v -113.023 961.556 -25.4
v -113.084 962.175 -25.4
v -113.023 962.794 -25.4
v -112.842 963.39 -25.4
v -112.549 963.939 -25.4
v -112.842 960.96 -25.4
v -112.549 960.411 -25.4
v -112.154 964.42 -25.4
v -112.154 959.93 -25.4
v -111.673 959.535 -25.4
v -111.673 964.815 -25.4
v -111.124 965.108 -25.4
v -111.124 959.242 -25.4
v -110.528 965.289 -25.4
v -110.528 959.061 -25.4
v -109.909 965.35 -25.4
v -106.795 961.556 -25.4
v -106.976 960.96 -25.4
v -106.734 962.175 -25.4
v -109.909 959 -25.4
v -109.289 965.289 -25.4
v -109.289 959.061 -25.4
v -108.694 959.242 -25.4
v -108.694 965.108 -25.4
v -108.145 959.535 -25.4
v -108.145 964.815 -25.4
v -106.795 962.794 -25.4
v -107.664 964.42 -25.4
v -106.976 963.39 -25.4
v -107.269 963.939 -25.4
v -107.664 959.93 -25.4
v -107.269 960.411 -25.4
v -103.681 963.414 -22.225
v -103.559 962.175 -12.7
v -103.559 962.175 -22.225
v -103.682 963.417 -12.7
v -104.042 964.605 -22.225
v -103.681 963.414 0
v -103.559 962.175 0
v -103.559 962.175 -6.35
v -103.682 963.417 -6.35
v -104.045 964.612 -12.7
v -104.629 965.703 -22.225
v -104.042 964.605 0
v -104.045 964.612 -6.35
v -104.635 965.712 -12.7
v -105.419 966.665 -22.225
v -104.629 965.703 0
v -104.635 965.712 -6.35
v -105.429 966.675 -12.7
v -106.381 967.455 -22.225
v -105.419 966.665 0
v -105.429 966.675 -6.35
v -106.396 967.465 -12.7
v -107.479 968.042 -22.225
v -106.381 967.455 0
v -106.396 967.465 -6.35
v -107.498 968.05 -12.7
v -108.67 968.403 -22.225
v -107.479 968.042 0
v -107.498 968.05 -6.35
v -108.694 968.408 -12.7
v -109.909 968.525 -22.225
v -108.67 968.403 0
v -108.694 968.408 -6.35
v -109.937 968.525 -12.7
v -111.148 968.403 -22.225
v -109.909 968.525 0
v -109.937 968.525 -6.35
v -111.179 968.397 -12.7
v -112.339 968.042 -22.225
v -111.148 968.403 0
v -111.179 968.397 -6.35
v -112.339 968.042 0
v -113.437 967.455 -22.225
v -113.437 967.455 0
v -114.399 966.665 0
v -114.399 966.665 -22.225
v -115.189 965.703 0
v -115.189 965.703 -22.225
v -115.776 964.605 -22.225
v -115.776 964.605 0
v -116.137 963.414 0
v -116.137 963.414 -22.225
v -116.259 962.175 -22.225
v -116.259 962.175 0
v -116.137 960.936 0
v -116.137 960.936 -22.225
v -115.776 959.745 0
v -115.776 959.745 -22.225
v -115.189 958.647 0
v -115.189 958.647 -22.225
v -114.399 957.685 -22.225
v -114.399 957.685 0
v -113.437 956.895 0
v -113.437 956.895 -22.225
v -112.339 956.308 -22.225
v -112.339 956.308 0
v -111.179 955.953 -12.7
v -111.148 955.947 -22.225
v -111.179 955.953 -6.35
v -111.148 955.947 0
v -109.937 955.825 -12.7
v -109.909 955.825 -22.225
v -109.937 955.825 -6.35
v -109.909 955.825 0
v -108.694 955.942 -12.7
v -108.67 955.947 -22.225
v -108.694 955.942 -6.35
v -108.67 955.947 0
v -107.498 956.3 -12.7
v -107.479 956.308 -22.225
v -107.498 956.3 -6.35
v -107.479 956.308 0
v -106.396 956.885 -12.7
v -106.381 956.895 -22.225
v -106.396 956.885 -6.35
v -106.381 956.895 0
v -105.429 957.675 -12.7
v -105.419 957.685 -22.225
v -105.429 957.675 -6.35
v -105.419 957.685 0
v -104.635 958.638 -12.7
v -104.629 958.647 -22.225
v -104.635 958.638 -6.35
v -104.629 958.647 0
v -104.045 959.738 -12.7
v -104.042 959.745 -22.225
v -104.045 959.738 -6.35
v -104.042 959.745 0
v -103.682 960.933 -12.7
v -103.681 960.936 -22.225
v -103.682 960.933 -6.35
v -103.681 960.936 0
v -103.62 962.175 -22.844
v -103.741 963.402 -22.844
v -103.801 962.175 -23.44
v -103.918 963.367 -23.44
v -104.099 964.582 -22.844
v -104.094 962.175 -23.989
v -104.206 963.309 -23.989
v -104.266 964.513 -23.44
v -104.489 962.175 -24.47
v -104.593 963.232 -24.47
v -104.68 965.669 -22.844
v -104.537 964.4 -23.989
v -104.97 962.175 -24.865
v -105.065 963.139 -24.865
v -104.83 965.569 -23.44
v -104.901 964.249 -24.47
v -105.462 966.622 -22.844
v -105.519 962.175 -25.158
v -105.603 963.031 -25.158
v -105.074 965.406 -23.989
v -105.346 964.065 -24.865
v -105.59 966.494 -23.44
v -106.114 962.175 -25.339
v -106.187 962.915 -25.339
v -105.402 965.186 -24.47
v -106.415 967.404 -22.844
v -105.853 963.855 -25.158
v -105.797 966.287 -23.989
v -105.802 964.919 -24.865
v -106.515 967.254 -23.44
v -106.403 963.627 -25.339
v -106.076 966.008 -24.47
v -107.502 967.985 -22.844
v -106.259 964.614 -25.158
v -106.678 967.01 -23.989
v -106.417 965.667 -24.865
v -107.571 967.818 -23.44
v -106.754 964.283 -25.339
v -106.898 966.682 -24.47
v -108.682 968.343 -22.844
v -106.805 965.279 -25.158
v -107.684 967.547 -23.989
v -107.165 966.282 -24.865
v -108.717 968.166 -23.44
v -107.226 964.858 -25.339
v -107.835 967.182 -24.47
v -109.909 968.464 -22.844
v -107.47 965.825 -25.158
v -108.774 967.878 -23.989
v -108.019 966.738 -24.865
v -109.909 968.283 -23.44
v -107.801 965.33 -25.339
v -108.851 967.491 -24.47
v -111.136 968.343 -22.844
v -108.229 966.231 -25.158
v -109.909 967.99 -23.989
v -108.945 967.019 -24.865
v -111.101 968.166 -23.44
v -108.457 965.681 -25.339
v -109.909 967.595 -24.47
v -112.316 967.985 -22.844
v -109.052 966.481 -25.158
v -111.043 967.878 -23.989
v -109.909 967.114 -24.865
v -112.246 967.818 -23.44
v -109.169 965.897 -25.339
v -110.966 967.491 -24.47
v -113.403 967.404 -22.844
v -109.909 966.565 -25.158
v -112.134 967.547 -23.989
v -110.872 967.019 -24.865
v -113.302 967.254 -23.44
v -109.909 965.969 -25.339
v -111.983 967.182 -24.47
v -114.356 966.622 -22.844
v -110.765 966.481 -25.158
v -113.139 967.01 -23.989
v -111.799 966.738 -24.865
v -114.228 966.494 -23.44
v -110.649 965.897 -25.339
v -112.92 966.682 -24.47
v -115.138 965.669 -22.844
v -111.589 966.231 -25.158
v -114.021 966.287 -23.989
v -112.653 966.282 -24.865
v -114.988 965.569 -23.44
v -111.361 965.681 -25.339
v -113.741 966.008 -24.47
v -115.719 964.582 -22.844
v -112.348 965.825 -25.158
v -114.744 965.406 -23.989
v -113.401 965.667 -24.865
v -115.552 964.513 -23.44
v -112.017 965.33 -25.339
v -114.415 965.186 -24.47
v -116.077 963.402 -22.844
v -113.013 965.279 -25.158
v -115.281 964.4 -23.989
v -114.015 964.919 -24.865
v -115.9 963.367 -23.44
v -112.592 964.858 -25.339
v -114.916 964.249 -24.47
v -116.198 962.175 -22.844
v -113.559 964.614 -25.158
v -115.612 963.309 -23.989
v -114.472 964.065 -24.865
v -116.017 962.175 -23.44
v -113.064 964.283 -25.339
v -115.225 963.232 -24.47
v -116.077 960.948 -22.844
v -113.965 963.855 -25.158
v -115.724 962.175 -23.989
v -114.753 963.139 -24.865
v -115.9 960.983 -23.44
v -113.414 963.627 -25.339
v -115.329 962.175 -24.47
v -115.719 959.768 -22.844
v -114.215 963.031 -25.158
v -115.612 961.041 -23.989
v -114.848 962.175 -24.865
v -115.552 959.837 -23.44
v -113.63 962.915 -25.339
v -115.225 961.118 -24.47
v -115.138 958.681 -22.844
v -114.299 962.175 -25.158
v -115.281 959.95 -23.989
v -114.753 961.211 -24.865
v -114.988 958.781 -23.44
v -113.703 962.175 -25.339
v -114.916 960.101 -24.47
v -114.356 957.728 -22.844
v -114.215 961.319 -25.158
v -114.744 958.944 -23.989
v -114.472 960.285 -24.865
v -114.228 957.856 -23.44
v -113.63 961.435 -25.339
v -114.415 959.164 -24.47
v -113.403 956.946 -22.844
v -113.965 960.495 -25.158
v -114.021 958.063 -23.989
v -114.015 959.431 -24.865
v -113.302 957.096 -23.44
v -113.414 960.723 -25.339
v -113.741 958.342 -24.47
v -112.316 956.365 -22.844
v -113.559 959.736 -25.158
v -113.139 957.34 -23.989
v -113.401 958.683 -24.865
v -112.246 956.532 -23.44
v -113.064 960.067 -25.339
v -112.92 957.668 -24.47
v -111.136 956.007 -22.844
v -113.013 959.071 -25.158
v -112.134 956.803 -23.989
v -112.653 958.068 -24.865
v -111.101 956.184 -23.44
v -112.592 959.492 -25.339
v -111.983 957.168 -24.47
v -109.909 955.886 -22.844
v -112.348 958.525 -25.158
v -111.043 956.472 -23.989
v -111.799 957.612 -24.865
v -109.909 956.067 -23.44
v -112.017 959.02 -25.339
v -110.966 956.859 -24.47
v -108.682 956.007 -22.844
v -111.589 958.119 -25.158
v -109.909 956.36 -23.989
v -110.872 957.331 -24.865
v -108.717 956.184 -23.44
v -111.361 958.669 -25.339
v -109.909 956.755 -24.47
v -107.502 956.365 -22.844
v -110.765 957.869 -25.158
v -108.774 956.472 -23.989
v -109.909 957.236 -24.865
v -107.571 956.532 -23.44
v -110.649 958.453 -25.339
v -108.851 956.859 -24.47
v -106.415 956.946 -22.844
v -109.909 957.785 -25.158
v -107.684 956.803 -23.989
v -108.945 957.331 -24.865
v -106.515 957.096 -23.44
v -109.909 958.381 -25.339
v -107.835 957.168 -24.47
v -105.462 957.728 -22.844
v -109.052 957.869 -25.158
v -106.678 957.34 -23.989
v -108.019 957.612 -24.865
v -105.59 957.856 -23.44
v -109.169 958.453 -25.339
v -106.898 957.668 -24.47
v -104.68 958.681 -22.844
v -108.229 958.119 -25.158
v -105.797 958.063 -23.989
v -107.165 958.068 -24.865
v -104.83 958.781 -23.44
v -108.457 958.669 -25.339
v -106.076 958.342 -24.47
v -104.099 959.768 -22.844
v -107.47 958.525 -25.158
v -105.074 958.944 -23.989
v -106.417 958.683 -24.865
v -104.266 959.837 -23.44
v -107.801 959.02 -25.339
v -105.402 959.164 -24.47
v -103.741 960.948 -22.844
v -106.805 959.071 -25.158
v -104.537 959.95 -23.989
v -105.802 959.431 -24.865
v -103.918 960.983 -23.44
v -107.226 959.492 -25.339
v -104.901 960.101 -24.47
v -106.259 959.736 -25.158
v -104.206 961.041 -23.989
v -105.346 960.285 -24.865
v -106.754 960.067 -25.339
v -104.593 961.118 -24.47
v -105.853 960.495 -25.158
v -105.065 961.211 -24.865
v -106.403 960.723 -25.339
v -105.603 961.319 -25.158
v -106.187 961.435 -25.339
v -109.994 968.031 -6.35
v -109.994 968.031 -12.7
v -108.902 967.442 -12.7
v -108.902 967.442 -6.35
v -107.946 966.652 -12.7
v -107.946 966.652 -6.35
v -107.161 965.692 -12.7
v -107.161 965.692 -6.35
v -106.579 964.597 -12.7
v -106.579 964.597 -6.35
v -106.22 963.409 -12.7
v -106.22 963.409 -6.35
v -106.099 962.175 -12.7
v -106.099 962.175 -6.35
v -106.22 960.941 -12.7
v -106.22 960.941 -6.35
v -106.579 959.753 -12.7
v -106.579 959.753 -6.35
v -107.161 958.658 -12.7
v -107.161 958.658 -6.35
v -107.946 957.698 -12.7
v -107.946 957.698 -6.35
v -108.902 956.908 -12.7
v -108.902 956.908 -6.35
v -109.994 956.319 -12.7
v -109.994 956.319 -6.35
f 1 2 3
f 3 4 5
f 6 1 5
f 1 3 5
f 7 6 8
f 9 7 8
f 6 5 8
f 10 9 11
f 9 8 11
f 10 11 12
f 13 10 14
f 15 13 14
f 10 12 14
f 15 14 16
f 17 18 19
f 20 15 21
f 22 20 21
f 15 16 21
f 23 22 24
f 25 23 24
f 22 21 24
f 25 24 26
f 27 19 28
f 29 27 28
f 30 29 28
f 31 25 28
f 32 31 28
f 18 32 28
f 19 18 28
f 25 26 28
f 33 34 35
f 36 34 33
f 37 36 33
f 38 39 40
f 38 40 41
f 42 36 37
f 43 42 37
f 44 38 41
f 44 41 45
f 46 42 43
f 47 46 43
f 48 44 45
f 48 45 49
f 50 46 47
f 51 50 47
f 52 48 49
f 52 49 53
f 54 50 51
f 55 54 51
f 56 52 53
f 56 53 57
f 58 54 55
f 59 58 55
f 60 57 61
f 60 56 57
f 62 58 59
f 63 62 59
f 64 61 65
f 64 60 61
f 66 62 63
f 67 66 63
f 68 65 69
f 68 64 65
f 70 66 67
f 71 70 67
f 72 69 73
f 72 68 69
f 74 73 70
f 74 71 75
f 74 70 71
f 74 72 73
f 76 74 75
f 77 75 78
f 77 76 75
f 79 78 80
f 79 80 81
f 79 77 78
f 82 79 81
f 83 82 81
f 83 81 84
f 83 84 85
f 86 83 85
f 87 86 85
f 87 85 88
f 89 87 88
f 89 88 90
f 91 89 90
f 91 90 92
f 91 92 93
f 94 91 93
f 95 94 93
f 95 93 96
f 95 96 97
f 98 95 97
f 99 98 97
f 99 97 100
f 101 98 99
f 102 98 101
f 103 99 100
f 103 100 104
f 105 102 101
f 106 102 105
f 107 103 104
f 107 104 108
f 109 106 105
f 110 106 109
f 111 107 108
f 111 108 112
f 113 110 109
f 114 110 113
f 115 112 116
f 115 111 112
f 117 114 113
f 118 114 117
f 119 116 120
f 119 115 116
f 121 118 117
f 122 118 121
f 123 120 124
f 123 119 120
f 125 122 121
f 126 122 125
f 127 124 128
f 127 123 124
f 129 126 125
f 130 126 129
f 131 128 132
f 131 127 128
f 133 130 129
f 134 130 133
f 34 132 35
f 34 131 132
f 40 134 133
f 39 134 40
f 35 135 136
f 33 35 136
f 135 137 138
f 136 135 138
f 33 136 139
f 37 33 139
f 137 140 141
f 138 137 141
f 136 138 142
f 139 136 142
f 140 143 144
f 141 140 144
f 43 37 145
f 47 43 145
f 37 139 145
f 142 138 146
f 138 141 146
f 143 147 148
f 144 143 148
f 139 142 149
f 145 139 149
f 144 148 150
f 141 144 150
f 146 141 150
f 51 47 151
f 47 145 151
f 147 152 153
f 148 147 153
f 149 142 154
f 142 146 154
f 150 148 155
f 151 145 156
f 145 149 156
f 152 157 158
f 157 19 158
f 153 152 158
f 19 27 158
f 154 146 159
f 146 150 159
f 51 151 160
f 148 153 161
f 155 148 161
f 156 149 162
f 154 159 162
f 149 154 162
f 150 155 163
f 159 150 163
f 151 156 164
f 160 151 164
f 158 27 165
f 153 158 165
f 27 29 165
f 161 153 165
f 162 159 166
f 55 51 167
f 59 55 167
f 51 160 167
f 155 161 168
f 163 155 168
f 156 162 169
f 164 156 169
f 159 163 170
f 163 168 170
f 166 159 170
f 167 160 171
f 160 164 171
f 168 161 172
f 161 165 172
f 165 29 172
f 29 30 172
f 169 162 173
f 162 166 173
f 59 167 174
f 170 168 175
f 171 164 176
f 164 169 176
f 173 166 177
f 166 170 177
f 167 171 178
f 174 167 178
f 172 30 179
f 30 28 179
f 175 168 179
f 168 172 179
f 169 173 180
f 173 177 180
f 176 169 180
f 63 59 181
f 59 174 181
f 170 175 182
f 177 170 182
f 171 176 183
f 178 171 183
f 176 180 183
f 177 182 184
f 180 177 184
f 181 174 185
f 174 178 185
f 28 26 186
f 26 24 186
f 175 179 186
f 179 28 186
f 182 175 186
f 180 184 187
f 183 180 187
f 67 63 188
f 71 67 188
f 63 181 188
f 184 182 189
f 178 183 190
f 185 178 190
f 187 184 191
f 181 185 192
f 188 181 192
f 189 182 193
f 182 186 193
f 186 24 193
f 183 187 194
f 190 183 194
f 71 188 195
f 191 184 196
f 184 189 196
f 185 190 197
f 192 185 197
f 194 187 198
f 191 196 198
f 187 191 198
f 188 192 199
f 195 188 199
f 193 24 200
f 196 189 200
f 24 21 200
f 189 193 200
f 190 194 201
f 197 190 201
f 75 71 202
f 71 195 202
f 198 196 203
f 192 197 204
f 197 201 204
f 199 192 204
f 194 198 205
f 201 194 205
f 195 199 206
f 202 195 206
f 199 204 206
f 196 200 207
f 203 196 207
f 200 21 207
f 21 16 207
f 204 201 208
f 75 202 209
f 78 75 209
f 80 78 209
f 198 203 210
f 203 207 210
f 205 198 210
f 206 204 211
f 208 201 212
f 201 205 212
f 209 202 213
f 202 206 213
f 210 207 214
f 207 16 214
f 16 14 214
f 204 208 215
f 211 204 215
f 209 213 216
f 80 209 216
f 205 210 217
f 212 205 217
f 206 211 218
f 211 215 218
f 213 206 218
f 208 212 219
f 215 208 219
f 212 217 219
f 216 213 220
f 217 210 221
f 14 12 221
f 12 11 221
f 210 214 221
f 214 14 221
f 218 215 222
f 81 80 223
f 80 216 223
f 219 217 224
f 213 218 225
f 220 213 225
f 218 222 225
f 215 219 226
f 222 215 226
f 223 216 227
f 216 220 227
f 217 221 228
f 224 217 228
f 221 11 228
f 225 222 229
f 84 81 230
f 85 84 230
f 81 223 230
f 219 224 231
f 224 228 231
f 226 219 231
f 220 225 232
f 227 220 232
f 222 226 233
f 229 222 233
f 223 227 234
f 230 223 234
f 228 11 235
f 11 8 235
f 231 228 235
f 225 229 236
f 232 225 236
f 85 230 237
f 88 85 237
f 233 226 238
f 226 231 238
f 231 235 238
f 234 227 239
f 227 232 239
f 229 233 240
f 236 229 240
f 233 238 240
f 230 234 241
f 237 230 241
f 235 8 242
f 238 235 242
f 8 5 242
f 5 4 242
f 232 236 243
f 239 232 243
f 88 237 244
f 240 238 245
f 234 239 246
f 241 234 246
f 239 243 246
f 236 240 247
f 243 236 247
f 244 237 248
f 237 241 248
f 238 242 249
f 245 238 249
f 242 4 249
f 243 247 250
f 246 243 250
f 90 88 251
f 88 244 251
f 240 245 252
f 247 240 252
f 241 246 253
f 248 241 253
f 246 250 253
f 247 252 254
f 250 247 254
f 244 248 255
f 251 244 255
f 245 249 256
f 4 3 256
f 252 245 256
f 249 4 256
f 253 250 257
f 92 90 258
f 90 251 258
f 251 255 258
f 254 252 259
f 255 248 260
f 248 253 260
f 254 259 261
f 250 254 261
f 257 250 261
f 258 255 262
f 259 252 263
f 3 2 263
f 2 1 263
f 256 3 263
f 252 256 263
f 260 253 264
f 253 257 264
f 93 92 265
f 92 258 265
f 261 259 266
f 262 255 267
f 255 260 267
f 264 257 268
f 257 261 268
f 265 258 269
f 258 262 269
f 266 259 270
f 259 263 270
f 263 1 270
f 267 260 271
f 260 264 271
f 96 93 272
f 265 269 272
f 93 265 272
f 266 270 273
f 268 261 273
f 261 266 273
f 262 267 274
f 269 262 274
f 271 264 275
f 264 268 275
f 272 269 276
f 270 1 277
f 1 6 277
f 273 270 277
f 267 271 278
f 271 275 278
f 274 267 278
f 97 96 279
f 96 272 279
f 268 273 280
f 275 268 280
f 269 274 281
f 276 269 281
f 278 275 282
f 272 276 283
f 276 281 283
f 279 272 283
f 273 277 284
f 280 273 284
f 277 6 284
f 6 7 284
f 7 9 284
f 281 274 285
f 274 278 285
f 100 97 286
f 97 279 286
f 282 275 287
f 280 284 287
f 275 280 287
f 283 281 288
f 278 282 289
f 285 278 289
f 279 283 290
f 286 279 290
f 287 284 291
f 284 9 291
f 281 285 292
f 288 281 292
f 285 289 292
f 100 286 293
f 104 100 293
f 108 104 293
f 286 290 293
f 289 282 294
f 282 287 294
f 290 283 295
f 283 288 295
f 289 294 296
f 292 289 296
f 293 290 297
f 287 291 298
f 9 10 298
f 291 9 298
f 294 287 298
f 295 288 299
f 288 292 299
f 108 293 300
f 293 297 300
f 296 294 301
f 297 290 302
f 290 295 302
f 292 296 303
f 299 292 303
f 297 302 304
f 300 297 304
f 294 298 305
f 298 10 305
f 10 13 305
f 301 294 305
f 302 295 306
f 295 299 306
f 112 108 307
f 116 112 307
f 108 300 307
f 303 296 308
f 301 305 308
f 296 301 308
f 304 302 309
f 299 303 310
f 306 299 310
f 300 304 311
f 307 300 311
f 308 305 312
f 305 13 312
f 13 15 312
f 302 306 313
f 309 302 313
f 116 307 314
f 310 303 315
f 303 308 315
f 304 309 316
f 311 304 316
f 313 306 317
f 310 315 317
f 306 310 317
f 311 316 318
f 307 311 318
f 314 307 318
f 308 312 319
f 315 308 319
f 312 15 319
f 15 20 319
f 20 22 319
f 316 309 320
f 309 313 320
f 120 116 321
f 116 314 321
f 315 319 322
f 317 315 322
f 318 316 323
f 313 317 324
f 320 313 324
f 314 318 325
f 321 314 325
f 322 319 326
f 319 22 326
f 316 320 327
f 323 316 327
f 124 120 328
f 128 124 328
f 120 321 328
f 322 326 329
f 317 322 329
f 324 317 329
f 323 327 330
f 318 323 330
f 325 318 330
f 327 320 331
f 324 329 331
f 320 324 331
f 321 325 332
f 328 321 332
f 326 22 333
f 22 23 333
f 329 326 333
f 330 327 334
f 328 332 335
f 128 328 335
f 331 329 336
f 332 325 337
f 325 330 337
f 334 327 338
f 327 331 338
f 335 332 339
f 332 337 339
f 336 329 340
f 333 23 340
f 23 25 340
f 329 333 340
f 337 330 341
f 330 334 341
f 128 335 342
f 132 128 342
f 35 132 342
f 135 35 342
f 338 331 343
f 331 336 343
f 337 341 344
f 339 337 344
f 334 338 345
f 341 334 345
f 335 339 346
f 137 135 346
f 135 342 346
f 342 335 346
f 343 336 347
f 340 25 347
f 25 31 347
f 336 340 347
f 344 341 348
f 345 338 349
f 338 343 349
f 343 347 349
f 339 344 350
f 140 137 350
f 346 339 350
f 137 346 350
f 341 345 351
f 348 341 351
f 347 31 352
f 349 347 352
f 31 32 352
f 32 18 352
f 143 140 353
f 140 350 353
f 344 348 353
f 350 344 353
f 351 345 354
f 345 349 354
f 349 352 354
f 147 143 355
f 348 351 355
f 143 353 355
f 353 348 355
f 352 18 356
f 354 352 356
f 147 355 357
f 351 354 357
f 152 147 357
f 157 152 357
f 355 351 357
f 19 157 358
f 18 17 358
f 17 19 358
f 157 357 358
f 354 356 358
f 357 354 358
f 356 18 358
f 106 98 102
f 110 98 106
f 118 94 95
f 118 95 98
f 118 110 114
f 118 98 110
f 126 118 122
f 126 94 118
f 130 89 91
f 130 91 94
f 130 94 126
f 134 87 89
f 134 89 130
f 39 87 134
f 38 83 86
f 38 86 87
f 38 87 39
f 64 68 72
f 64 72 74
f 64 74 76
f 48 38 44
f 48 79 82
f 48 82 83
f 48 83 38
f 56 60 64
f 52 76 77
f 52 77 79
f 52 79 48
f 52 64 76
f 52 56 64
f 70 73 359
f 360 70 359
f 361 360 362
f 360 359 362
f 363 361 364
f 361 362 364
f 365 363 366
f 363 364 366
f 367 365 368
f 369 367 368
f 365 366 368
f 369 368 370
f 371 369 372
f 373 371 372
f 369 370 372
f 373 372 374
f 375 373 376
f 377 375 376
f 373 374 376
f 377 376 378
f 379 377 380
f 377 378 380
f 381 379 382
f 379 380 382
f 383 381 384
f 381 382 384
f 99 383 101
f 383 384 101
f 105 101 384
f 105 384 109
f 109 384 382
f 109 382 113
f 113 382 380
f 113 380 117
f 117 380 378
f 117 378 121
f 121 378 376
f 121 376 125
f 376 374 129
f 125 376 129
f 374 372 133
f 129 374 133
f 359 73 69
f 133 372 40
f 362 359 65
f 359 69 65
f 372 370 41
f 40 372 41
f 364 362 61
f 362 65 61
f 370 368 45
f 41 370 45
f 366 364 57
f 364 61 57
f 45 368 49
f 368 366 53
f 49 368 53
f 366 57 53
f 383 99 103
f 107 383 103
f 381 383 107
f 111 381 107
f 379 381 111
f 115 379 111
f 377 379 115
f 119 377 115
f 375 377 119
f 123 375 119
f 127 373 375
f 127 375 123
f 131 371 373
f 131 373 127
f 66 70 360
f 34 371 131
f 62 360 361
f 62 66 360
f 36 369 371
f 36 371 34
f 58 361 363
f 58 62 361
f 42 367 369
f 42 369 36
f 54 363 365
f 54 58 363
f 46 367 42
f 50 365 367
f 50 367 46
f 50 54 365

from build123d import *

# Parameters (mm, degrees)
SKETCH1_R          = 6.35
EXTRUDE1_DEPTH     = 25.4
CUT_EXTRUDE1_DEPTH = 6.35
FILLET1_R          = 3.175


with BuildPart() as part:
    # Sketch1 → Extrude1 (new body)
    with BuildSketch(Plane.XY):
        with Locations((-109.908874461, 962.175)):
            Circle(SKETCH1_R)
    extrude(amount=-EXTRUDE1_DEPTH)

    # Sketch2 → Cut-Extrude1 (cut)
    with BuildSketch(Plane(origin=(0, 0, -6.35), x_dir=(-1, 0, 0), z_dir=(0, 0, -1))):
        with BuildLine():
            ThreePointArc((111.178874461, 968.396703947), (106.098874461, 962.175), (111.178874461, 955.953296053))
            ThreePointArc((111.178874461, 955.953296053), (103.558874461, 962.175), (111.178874461, 968.396703947))
        make_face()
    extrude(amount=CUT_EXTRUDE1_DEPTH, mode=Mode.SUBTRACT)

    # Fillet1
    fillet1_edges = [part.edges().sort_by_distance(p)[0] for p in [
        (-116.258874461, 962.175, -25.4),
    ]]
    fillet(fillet1_edges, radius=FILLET1_R)


solid = part.part
